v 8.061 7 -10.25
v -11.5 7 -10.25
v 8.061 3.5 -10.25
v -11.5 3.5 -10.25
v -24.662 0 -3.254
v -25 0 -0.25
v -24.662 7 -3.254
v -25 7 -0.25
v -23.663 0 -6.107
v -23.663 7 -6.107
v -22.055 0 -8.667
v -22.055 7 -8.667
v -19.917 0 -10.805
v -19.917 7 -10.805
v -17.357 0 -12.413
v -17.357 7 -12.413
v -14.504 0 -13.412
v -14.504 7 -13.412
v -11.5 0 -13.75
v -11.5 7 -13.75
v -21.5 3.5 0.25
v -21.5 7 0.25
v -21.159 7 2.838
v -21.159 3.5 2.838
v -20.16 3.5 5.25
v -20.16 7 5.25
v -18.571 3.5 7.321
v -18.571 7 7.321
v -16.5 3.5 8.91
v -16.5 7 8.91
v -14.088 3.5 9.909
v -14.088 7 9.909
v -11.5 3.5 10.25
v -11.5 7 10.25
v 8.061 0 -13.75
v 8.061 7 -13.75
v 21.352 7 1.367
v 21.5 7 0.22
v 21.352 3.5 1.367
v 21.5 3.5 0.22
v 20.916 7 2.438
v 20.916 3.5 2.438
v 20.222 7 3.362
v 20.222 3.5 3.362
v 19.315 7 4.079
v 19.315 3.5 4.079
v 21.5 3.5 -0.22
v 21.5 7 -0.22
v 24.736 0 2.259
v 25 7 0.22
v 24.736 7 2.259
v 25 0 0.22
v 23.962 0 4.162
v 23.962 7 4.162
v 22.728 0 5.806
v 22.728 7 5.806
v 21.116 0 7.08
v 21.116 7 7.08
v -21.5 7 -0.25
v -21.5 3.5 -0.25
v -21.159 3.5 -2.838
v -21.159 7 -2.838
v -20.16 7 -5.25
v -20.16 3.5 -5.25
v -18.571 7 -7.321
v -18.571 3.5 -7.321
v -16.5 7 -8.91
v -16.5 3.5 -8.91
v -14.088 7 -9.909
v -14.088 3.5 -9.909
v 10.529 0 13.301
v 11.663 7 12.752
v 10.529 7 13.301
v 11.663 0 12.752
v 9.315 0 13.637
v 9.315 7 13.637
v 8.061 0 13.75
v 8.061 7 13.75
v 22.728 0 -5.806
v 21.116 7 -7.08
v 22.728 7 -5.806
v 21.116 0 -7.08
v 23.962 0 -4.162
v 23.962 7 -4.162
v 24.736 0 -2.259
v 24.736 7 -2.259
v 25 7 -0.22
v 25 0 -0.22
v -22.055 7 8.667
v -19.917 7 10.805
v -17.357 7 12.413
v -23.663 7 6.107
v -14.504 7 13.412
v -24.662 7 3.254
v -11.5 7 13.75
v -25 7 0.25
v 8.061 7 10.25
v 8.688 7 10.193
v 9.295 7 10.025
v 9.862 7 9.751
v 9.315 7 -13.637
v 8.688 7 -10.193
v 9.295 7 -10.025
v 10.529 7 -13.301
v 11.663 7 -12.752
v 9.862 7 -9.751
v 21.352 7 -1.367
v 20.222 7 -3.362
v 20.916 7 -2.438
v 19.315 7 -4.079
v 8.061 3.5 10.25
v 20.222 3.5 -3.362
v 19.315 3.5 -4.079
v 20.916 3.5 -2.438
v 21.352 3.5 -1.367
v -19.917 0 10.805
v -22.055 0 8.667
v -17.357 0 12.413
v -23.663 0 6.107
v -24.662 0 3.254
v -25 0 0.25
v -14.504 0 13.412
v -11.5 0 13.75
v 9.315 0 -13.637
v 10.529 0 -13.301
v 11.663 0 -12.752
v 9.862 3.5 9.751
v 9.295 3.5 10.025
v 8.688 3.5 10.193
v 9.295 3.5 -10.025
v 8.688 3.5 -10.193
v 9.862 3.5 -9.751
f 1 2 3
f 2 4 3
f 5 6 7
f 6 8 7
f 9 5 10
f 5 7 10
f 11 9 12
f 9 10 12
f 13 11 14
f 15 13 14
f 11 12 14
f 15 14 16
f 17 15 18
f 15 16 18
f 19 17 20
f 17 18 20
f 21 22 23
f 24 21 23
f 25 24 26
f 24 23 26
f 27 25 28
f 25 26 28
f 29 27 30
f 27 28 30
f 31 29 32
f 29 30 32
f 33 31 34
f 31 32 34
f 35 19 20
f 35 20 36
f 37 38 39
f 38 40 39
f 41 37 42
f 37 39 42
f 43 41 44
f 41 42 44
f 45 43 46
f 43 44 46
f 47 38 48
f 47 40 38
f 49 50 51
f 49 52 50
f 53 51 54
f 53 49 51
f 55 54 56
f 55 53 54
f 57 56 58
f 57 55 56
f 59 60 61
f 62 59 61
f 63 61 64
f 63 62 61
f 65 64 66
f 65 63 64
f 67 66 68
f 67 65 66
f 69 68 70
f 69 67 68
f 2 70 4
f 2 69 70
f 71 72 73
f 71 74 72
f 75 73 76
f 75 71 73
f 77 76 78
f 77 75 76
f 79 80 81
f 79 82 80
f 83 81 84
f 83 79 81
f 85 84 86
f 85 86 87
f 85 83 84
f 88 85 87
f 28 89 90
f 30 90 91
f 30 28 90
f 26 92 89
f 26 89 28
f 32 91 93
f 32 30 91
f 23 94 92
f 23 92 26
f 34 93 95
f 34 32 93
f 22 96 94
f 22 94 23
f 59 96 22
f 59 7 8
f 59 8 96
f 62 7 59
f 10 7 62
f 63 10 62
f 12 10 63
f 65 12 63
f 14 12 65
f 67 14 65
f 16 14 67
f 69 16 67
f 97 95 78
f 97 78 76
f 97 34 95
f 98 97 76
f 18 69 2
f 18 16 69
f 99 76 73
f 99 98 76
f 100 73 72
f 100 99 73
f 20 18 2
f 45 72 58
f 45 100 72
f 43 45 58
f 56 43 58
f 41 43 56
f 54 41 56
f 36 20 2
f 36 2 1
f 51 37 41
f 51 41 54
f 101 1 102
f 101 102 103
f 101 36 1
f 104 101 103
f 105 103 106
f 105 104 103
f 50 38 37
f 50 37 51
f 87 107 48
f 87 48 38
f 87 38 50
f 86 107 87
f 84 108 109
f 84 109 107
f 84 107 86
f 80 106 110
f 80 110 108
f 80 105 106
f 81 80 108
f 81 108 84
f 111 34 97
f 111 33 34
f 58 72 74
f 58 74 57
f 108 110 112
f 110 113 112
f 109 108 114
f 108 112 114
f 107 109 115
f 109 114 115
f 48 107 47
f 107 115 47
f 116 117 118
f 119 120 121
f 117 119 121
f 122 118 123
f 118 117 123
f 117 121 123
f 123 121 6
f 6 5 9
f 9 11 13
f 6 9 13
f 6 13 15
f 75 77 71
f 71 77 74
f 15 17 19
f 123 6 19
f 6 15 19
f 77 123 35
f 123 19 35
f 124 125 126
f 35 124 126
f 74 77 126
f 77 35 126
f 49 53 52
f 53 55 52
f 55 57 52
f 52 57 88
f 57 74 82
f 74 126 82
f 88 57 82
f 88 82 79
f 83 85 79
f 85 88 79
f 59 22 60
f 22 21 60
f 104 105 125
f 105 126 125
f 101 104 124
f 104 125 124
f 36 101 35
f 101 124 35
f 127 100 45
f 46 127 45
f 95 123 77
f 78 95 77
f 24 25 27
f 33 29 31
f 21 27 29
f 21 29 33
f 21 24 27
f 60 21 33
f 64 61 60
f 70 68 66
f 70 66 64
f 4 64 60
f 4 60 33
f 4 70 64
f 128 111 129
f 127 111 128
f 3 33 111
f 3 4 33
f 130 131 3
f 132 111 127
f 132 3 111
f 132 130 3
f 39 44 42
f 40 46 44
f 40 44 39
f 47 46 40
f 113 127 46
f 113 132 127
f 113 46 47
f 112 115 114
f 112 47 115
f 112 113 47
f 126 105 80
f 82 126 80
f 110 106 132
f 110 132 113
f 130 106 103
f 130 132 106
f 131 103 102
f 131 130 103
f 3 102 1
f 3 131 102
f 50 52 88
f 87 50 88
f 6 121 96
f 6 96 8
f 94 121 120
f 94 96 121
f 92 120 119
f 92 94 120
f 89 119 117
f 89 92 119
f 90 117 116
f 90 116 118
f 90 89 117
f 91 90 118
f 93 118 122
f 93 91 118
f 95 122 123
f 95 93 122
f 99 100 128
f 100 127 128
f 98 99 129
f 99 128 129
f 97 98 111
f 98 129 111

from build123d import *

# Parameters (mm, degrees)
SKETCH1_W           = 50
SKETCH1_H           = 27.5
BOSS_EXTRUDE1_DEPTH = 7
FILLET1_R           = 13.5
CUT_EXTRUDE1_REACH  = 31.378
FILLET2_R           = 8
FILLET3_R           = 7
SHELL1_T            = -3.5


with BuildPart() as part:
    # Sketch1 → Boss-Extrude1 (new body)
    with BuildSketch(Plane(origin=(0, 0, 0), x_dir=(1, 0, 0), z_dir=(0, 1, 0))):
        Rectangle(SKETCH1_W, SKETCH1_H)
    extrude(amount=BOSS_EXTRUDE1_DEPTH)

    # Fillet1
    fillet1_edges = [part.edges().sort_by_distance(p)[0] for p in [
        (-25, 3.5, 13.75),
        (-25, 3.5, -13.75),
    ]]
    fillet(fillet1_edges, radius=FILLET1_R)

    # Sketch3 → Cut-Extrude1 (cut, up to next)
    with BuildSketch(Plane(origin=(0, 7, 0), x_dir=(1, 0, 0), z_dir=(0, 1, 0)), mode=Mode.PRIVATE) as cut_extrude1_sk1:
        Polygon((10, 13.75), (25, 4.75), (25, 13.75), align=None)
    cut_extrude1_tool1 = extrude(cut_extrude1_sk1.sketch, amount=-CUT_EXTRUDE1_REACH, mode=Mode.PRIVATE) & part.part
    # Sketch3 → Cut-Extrude1 (cut, up to next)
    with BuildSketch(Plane(origin=(0, 7, 0), x_dir=(1, 0, 0), z_dir=(0, 1, 0)), mode=Mode.PRIVATE) as cut_extrude1_sk2:
        Polygon((25, -13.75), (10, -13.75), (25, -4.75), align=None)
    cut_extrude1_tool2 = extrude(cut_extrude1_sk2.sketch, amount=-CUT_EXTRUDE1_REACH, mode=Mode.PRIVATE) & part.part
    add(cut_extrude1_tool1.solids().sort_by_distance((20, 7, -10.75))[0], mode=Mode.SUBTRACT)
    add(cut_extrude1_tool2.solids().sort_by_distance((20, 7, 10.75))[0], mode=Mode.SUBTRACT)

    # Fillet2
    fillet2_edges = [part.edges().sort_by_distance(p)[0] for p in [
        (25, 3.5, -4.75),
        (25, 3.5, 4.75),
    ]]
    fillet(fillet2_edges, radius=FILLET2_R)

    # Fillet3
    fillet3_edges = [part.edges().sort_by_distance(p)[0] for p in [
        (10, 3.5, -13.75),
        (10, 3.5, 13.75),
    ]]
    fillet(fillet3_edges, radius=FILLET3_R)

    # Shell1
    shell1_openings = [part.faces().sort_by_distance(p)[0] for p in [
        (-0.99153661, 7, 0),
    ]]
    offset(amount=SHELL1_T, openings=shell1_openings, kind=Kind.INTERSECTION)


solid = part.part
